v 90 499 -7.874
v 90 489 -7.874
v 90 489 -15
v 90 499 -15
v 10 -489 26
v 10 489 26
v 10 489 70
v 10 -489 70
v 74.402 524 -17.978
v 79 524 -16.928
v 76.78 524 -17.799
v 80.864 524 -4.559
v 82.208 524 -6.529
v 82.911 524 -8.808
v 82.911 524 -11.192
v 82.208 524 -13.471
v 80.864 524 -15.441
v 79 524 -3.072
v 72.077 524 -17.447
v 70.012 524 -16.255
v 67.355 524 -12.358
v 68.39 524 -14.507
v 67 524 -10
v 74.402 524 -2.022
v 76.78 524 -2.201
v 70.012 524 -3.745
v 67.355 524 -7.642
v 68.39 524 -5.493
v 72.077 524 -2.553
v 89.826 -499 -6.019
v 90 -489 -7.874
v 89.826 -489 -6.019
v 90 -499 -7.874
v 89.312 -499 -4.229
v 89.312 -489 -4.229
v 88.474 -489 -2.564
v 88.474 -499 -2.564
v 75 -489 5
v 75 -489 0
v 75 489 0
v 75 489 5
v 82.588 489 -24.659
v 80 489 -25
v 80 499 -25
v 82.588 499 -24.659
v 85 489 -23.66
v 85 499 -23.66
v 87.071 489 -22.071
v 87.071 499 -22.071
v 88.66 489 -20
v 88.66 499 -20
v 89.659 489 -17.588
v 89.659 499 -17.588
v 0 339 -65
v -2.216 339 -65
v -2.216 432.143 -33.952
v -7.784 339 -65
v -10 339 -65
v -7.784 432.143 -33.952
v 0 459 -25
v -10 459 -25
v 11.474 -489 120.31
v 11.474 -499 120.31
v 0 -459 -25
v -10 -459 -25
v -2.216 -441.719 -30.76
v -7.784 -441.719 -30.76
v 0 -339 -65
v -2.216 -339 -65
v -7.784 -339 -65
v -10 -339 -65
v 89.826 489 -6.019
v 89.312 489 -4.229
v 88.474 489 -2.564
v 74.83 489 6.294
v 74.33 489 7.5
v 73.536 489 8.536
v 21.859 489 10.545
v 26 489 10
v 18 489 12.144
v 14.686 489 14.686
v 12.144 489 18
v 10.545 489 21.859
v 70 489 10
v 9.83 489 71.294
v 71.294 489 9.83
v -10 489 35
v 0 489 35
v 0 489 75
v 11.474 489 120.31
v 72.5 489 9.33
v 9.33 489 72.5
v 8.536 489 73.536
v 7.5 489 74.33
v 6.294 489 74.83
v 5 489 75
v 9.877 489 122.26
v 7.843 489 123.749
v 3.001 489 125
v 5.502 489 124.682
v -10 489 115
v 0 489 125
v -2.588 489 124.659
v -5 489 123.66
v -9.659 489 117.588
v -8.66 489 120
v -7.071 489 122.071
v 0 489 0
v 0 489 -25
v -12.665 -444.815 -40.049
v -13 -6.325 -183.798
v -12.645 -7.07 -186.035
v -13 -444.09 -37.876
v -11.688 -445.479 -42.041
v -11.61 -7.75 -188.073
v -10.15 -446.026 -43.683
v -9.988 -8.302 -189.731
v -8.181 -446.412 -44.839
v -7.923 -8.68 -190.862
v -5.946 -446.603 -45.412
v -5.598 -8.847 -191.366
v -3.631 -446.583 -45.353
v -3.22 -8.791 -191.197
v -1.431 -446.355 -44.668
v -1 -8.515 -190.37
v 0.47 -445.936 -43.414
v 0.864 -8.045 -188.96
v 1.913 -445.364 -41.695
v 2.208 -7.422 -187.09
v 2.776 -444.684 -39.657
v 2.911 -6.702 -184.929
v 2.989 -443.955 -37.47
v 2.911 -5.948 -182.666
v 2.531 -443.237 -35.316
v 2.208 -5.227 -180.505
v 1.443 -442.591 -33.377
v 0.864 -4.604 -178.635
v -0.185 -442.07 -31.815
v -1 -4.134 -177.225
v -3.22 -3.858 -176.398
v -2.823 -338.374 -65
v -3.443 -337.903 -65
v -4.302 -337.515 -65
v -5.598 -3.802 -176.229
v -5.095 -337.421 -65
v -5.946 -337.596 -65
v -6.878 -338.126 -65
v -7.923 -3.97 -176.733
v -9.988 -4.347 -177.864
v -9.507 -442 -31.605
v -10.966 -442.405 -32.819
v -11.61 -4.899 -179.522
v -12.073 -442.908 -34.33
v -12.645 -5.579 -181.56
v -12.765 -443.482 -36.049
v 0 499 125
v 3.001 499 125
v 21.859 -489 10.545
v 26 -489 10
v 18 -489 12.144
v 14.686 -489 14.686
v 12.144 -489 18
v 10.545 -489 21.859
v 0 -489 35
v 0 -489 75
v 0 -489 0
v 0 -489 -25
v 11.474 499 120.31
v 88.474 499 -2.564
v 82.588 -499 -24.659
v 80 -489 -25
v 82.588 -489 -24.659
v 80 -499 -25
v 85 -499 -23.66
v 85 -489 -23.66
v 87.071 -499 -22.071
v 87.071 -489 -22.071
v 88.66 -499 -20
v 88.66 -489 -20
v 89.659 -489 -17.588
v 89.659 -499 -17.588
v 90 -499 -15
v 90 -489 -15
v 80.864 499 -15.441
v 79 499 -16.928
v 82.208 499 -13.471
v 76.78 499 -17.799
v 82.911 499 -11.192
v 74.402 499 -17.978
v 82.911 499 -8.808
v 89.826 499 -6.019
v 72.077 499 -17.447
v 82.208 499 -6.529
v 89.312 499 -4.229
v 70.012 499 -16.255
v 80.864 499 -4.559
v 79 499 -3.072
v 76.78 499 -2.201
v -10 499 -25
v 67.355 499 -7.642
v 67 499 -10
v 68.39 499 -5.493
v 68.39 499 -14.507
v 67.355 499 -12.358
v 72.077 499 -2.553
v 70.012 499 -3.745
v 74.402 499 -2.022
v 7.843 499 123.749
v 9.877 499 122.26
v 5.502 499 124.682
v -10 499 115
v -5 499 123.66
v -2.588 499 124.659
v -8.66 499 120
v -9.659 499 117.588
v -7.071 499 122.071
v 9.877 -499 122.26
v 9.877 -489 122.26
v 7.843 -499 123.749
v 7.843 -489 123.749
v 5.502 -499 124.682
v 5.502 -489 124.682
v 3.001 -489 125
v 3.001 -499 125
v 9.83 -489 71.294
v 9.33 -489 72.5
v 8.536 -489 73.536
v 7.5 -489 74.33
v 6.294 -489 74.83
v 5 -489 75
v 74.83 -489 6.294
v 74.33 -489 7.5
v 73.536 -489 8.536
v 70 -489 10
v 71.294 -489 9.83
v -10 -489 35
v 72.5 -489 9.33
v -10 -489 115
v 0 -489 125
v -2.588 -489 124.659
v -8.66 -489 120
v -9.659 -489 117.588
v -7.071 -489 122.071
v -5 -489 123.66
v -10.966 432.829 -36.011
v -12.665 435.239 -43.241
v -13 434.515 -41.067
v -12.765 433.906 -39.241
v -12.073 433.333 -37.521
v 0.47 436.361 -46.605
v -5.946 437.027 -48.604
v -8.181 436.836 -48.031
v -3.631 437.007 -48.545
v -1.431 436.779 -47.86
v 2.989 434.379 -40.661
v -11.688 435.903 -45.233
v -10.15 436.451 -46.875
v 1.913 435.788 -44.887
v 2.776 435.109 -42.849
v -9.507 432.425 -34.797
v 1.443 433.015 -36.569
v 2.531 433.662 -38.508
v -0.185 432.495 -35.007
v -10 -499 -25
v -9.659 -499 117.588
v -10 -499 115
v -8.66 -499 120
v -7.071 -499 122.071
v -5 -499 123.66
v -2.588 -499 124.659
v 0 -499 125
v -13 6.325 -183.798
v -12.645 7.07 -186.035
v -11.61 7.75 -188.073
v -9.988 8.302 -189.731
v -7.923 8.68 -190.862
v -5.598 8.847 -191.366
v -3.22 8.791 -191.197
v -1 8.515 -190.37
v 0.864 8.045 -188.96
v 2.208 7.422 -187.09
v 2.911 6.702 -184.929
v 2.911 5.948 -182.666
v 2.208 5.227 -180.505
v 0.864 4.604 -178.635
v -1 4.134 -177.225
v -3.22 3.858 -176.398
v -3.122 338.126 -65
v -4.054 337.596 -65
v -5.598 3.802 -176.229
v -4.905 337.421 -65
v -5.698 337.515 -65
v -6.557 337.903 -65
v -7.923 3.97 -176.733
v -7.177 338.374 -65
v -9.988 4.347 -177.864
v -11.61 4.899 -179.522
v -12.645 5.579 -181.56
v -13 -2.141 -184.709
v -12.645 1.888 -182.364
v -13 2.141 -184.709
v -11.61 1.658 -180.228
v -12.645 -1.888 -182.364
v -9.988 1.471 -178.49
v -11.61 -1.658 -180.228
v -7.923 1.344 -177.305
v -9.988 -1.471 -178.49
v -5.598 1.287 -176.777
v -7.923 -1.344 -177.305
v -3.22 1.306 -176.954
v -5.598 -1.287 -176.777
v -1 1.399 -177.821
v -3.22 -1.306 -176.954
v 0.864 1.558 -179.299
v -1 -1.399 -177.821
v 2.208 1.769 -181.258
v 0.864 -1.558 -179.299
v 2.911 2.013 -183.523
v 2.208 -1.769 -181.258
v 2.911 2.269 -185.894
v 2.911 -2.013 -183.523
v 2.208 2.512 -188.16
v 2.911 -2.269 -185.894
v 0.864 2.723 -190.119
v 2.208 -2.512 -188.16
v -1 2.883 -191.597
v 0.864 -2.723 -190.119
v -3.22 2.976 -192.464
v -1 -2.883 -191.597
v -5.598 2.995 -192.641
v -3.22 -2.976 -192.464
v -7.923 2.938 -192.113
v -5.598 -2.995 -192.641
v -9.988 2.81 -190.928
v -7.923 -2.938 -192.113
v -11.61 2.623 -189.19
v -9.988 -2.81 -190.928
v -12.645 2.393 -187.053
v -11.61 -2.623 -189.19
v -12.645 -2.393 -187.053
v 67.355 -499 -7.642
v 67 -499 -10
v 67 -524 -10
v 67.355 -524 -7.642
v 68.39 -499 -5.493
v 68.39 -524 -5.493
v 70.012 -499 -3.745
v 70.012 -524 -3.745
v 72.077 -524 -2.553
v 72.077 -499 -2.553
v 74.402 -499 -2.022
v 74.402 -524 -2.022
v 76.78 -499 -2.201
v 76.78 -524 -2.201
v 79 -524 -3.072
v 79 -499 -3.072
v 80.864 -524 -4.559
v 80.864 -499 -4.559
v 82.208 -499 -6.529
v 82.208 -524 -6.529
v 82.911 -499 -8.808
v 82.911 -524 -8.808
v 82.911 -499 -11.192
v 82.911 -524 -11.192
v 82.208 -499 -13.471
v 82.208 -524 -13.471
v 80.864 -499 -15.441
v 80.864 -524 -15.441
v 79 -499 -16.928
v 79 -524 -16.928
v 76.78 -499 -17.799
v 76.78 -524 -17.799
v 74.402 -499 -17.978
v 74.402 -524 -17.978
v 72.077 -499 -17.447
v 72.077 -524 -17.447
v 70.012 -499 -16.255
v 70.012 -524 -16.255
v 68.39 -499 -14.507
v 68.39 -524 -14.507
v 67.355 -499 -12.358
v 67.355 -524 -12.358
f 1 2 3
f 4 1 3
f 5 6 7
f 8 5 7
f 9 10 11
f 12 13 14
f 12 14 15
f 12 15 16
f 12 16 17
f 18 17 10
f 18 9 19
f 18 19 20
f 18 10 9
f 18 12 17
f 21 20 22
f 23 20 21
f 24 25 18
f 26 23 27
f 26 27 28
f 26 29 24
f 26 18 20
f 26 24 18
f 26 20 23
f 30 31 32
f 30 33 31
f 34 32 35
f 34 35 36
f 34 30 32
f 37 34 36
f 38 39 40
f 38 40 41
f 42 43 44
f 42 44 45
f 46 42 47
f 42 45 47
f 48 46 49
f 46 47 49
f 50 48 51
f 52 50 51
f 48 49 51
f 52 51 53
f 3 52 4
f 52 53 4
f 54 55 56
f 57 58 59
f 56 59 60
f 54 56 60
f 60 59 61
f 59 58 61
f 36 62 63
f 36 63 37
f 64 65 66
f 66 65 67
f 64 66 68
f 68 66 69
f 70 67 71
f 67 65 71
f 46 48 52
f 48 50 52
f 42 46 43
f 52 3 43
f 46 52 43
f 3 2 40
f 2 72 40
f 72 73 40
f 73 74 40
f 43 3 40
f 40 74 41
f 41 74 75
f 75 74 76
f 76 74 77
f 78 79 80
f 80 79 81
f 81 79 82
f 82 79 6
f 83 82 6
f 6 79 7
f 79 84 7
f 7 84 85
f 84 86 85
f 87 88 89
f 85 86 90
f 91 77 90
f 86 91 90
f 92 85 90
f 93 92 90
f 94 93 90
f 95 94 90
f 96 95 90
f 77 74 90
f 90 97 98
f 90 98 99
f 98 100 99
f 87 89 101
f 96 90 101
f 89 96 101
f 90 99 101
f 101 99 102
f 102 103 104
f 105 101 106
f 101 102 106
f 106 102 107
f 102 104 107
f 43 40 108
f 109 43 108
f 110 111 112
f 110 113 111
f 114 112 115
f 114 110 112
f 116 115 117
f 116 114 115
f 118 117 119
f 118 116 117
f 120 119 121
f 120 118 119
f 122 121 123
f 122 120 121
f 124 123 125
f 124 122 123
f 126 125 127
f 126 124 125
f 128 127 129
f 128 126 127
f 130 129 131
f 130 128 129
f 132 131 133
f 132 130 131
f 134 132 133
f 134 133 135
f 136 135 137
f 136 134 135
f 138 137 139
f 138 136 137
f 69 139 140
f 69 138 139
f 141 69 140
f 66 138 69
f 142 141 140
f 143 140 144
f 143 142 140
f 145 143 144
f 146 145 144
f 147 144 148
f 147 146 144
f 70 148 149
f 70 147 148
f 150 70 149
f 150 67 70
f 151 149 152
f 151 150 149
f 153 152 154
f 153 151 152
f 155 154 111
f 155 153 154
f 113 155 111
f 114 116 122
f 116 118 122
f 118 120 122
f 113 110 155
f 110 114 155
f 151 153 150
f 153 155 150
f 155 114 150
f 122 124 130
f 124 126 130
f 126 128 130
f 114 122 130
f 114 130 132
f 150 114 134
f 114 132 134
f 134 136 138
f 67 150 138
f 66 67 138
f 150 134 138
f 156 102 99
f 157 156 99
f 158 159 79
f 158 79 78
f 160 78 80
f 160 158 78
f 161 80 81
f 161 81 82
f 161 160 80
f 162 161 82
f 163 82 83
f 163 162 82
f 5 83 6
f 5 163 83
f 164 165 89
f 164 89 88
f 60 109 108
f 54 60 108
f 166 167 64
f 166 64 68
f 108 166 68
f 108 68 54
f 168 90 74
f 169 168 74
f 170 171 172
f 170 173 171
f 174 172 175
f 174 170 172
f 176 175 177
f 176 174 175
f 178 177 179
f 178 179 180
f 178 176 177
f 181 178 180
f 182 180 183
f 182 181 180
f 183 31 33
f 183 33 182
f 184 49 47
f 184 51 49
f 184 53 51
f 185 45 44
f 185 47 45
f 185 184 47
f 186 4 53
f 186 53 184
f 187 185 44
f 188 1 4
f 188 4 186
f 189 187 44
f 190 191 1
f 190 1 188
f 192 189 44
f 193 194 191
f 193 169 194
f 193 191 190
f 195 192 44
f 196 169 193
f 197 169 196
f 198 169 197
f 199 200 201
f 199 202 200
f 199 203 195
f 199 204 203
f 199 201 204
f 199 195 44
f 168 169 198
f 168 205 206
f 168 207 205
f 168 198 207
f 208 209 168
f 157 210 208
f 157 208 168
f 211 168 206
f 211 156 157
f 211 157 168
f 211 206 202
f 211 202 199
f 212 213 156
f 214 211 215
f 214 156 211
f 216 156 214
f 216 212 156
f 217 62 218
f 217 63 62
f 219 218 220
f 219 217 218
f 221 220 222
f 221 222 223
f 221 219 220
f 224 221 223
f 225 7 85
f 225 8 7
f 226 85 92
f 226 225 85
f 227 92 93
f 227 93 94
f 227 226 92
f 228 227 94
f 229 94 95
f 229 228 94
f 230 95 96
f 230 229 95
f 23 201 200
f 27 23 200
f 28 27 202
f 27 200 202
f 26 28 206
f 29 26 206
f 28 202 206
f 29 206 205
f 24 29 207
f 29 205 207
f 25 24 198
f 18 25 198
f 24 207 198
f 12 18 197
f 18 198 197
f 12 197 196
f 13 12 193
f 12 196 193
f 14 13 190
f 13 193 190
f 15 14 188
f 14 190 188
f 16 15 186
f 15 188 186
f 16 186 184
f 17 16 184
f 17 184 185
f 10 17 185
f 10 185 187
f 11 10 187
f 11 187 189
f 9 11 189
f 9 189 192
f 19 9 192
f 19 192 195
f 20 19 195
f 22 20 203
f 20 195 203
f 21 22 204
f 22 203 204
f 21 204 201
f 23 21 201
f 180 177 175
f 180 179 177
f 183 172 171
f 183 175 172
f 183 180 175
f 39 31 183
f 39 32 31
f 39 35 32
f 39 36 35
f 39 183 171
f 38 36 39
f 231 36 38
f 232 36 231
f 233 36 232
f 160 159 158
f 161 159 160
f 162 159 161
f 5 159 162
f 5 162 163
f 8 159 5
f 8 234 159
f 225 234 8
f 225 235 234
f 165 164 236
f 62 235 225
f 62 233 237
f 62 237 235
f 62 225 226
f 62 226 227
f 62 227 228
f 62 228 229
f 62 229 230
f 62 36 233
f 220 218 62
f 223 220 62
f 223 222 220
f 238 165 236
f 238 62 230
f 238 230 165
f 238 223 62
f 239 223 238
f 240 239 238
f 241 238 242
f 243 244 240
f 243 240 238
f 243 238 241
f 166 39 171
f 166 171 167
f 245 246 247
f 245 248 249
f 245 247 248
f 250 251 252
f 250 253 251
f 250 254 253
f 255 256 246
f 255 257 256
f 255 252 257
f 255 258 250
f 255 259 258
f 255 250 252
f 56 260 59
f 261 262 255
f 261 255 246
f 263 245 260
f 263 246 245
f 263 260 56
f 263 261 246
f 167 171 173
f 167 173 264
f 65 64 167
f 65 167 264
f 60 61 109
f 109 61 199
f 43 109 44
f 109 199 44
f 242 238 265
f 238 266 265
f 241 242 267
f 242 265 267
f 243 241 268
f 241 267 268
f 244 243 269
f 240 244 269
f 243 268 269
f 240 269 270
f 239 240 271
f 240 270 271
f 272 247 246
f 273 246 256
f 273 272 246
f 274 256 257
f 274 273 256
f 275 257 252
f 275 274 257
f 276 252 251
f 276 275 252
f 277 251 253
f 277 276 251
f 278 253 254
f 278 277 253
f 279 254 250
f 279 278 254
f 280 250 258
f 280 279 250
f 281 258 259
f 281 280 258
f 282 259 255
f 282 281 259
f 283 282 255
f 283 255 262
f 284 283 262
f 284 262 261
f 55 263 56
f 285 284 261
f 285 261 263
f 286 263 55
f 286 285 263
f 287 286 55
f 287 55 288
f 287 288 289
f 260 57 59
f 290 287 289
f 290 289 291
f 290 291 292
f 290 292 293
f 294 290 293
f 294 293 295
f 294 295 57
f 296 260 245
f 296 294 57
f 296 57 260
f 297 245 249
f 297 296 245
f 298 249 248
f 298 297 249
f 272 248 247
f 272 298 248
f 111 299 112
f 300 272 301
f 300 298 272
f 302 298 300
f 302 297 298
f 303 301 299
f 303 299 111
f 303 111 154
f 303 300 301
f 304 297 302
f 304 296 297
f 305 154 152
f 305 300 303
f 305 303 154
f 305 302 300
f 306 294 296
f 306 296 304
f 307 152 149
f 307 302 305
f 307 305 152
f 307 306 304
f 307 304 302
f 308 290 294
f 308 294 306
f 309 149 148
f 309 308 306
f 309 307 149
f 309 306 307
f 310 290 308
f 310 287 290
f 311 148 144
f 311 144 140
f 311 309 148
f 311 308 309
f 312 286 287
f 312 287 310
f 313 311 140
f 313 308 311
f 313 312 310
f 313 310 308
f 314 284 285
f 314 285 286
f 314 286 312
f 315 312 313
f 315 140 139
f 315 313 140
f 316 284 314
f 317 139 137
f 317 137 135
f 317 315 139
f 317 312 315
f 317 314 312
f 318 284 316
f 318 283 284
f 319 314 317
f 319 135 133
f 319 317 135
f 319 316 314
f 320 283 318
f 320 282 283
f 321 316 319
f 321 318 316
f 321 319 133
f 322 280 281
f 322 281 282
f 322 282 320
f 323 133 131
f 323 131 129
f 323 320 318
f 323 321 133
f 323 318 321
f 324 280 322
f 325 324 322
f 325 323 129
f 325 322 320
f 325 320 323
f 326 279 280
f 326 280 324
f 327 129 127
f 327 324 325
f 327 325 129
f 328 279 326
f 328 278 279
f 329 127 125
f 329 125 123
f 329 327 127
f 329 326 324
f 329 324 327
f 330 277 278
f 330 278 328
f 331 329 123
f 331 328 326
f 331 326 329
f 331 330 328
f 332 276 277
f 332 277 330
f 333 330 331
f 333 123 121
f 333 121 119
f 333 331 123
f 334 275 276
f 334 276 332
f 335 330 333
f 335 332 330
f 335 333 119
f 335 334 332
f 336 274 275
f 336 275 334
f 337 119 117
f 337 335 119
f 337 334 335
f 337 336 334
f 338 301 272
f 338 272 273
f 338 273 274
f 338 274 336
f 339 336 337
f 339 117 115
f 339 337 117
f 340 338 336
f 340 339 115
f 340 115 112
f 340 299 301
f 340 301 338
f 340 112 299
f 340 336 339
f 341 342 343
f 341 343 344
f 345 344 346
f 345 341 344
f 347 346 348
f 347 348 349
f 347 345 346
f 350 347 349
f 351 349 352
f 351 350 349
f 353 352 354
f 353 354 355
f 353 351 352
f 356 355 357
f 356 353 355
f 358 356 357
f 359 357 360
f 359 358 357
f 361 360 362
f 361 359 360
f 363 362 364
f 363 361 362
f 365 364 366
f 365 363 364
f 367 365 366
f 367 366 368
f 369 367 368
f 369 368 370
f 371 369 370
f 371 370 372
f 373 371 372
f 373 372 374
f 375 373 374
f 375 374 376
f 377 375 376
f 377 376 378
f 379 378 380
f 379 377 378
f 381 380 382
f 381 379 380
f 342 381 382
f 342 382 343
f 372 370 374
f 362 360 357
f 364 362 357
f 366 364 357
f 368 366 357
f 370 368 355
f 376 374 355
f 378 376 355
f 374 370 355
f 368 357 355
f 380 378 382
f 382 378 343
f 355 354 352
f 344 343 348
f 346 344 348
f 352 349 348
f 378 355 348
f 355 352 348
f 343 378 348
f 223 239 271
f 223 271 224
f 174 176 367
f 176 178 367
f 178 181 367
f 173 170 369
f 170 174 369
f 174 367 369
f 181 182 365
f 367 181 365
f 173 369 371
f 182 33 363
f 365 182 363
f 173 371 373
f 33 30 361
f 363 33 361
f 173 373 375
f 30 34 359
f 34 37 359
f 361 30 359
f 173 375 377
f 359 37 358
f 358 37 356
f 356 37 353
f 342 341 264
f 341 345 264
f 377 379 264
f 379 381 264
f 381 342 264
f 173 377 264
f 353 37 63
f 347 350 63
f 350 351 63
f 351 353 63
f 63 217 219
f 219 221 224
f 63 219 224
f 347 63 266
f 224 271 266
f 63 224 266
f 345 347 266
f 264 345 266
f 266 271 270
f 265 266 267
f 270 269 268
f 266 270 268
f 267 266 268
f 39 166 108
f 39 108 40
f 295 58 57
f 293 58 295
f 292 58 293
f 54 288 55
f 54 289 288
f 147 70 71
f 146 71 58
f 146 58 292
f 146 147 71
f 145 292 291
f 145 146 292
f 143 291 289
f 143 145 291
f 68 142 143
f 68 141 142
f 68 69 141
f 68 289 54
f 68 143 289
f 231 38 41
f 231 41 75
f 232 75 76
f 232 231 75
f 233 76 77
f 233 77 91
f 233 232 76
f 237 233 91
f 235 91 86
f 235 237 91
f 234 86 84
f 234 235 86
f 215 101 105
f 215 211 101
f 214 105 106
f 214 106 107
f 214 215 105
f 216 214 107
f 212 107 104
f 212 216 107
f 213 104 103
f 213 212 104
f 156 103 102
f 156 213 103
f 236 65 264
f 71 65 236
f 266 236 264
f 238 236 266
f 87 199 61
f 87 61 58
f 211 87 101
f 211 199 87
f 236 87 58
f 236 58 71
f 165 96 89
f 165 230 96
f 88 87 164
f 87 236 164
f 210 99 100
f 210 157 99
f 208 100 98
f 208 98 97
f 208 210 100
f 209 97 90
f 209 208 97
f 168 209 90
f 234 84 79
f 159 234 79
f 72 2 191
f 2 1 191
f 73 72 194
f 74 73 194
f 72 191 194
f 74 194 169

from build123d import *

# Parameters (mm, degrees)
F1_DEPTH      = 489
F1_DEPTH_BACK = 489
F2_W          = 10
F2_H          = 100
F3_DEPTH      = 489
F3_DEPTH_BACK = 489
F5_DEPTH      = 10
F6_R          = 10
F7_R          = 8
F8_DEPTH      = 25
F9_T4_DEPTH   = 788.5183031967
F9_T9_DEPTH   = 788.5183031967
F13_R         = 8


# Not quite as in the source:
# - a fillet or chamfer that OpenCascade refuses, or shapes differently, is made with other operations: its cross-section is extruded or revolved along the edge and cut away or added
# - a pattern or mirror of a feature is missing from the dataset's text; its kind, count and spacing are read off the source's solid
# - a feature names something its author has since deleted; it is built from what else it names


with BuildPart() as f1:
    # F0 (on Front) → F1 (new body, two sides)
    with BuildSketch(Plane.XZ) as f1_sk:
        with BuildLine():
            Line((5, 75), (0, 75))
            Line((0, 75), (0, 0))
            Line((0, 0), (75, 0))
            Line((75, 0), (75, 5))
            ThreePointArc((75, 5), (73.5355339059, 8.5355339059), (70, 10))
            Line((70, 10), (26, 10))
            ThreePointArc((26, 10), (14.686291501, 14.686291501), (10, 26))
            Line((10, 26), (10, 70))
            ThreePointArc((10, 70), (8.5355339059, 73.5355339059), (5, 75))
        make_face()
    extrude(amount=F1_DEPTH)
    extrude(f1_sk.sketch, amount=-F1_DEPTH_BACK)

    # F2 (on Front) → F3 (join, two sides)
    with BuildSketch(Plane.XZ) as f3_sk:
        with Locations((-5, -15)):
            Rectangle(F2_W, F2_H)
    extrude(amount=F3_DEPTH)
    extrude(f3_sk.sketch, amount=-F3_DEPTH_BACK)

    # F4 (on face) → F5 (join)
    with BuildSketch(Plane(origin=(0, 489, 0), x_dir=(-1, 0, 0), z_dir=(0, 1, 0))):
        Polygon((-90, -25), (10, -25), (10, 125), (-8.5355339059, 125), (-90, -5), align=None)
    f5 = extrude(amount=F5_DEPTH)

    # F5_copies: F5 across plane
    add(f5.mirror(Plane(origin=(0, 0, 0), x_dir=(0, 0, -1), z_dir=(0, -1, 0))))

    # F6
    f6_edges = [f1.edges().sort_by_distance(p)[0] for p in [
        (8.535534, 494, 125),
        (90, 494, -5),
        (90, 494, -25),
        (-10, 494, 125),
        (-10, -494, 125),
        (8.535534, -494, 125),
        (90, -494, -25),
        (90, -494, -5),
    ]]
    fillet(f6_edges, radius=F6_R)

    # F7 (on face) → F8 (join)
    with BuildSketch(Plane(origin=(0, 499, 0), x_dir=(-1, 0, 0), z_dir=(0, 1, 0))):
        with Locations((-75, -10)):
            Circle(F7_R)
    f8 = extrude(amount=F8_DEPTH)

    # F8_copies: F8 across plane
    add(f8.mirror(Plane(origin=(0, 0, 0), x_dir=(0, 0, -1), z_dir=(0, -1, 0))))

    # F9: chamfer of 150 x 50 on 2 edges, made by hand


with BuildPart() as f9_tool2:
    # F9_s3 → F9_t4 (new body)
    with BuildSketch(Plane.YZ.offset(-399.2591515984)):
        Polygon((-489, -15), (-339, -65), (-489, -65), align=None)
    extrude(amount=F9_T4_DEPTH)

    split(bisect_by=Plane.XY.offset(-25), keep=Keep.BOTTOM)


with BuildPart() as f1_1:
    add(f1.part)

    # F9_t1: cut F9_tool2
    add(f9_tool2.part, mode=Mode.SUBTRACT)


with BuildPart() as f9_tool7:
    # F9_s8 → F9_t9 (new body)
    with BuildSketch(Plane.YZ.offset(-399.2591515984)):
        Polygon((339, -65), (489, -15), (489, -65), align=None)
    extrude(amount=F9_T9_DEPTH)

    split(bisect_by=Plane.XY.offset(-25), keep=Keep.BOTTOM)


with BuildPart() as f1_2:
    add(f1_1.part)

    # F9_t6: cut F9_tool7
    add(f9_tool7.part, mode=Mode.SUBTRACT)

    # F14: sweep along a path in F11
    with BuildLine(Plane(origin=(-5, 0, 0), x_dir=(0, -1, 0), z_dir=(-1, 0, 0))) as f14_path:
        Line((-434.5147456835, -41.0674455892), (-6.3245553203, -183.7975090436))
        ThreePointArc((-6.3245553203, -183.7975090436), (0, -184.8238430826), (6.3245553203, -183.7975090436))
        Line((6.3245553203, -183.7975090436), (444.0904629777, -37.8755398245))
    # F13 (on line) → F14 (sweep)
    with BuildSketch(Plane(origin=(0, 378.7430374384, 126.2476791461), x_dir=(-1, 0, 0), z_dir=(0, 0.9486832981, 0.316227766))):
        with Locations((5, -176.365627053)):
            Circle(F13_R)
    sweep(path=f14_path.line)


solid = f1_2.part
